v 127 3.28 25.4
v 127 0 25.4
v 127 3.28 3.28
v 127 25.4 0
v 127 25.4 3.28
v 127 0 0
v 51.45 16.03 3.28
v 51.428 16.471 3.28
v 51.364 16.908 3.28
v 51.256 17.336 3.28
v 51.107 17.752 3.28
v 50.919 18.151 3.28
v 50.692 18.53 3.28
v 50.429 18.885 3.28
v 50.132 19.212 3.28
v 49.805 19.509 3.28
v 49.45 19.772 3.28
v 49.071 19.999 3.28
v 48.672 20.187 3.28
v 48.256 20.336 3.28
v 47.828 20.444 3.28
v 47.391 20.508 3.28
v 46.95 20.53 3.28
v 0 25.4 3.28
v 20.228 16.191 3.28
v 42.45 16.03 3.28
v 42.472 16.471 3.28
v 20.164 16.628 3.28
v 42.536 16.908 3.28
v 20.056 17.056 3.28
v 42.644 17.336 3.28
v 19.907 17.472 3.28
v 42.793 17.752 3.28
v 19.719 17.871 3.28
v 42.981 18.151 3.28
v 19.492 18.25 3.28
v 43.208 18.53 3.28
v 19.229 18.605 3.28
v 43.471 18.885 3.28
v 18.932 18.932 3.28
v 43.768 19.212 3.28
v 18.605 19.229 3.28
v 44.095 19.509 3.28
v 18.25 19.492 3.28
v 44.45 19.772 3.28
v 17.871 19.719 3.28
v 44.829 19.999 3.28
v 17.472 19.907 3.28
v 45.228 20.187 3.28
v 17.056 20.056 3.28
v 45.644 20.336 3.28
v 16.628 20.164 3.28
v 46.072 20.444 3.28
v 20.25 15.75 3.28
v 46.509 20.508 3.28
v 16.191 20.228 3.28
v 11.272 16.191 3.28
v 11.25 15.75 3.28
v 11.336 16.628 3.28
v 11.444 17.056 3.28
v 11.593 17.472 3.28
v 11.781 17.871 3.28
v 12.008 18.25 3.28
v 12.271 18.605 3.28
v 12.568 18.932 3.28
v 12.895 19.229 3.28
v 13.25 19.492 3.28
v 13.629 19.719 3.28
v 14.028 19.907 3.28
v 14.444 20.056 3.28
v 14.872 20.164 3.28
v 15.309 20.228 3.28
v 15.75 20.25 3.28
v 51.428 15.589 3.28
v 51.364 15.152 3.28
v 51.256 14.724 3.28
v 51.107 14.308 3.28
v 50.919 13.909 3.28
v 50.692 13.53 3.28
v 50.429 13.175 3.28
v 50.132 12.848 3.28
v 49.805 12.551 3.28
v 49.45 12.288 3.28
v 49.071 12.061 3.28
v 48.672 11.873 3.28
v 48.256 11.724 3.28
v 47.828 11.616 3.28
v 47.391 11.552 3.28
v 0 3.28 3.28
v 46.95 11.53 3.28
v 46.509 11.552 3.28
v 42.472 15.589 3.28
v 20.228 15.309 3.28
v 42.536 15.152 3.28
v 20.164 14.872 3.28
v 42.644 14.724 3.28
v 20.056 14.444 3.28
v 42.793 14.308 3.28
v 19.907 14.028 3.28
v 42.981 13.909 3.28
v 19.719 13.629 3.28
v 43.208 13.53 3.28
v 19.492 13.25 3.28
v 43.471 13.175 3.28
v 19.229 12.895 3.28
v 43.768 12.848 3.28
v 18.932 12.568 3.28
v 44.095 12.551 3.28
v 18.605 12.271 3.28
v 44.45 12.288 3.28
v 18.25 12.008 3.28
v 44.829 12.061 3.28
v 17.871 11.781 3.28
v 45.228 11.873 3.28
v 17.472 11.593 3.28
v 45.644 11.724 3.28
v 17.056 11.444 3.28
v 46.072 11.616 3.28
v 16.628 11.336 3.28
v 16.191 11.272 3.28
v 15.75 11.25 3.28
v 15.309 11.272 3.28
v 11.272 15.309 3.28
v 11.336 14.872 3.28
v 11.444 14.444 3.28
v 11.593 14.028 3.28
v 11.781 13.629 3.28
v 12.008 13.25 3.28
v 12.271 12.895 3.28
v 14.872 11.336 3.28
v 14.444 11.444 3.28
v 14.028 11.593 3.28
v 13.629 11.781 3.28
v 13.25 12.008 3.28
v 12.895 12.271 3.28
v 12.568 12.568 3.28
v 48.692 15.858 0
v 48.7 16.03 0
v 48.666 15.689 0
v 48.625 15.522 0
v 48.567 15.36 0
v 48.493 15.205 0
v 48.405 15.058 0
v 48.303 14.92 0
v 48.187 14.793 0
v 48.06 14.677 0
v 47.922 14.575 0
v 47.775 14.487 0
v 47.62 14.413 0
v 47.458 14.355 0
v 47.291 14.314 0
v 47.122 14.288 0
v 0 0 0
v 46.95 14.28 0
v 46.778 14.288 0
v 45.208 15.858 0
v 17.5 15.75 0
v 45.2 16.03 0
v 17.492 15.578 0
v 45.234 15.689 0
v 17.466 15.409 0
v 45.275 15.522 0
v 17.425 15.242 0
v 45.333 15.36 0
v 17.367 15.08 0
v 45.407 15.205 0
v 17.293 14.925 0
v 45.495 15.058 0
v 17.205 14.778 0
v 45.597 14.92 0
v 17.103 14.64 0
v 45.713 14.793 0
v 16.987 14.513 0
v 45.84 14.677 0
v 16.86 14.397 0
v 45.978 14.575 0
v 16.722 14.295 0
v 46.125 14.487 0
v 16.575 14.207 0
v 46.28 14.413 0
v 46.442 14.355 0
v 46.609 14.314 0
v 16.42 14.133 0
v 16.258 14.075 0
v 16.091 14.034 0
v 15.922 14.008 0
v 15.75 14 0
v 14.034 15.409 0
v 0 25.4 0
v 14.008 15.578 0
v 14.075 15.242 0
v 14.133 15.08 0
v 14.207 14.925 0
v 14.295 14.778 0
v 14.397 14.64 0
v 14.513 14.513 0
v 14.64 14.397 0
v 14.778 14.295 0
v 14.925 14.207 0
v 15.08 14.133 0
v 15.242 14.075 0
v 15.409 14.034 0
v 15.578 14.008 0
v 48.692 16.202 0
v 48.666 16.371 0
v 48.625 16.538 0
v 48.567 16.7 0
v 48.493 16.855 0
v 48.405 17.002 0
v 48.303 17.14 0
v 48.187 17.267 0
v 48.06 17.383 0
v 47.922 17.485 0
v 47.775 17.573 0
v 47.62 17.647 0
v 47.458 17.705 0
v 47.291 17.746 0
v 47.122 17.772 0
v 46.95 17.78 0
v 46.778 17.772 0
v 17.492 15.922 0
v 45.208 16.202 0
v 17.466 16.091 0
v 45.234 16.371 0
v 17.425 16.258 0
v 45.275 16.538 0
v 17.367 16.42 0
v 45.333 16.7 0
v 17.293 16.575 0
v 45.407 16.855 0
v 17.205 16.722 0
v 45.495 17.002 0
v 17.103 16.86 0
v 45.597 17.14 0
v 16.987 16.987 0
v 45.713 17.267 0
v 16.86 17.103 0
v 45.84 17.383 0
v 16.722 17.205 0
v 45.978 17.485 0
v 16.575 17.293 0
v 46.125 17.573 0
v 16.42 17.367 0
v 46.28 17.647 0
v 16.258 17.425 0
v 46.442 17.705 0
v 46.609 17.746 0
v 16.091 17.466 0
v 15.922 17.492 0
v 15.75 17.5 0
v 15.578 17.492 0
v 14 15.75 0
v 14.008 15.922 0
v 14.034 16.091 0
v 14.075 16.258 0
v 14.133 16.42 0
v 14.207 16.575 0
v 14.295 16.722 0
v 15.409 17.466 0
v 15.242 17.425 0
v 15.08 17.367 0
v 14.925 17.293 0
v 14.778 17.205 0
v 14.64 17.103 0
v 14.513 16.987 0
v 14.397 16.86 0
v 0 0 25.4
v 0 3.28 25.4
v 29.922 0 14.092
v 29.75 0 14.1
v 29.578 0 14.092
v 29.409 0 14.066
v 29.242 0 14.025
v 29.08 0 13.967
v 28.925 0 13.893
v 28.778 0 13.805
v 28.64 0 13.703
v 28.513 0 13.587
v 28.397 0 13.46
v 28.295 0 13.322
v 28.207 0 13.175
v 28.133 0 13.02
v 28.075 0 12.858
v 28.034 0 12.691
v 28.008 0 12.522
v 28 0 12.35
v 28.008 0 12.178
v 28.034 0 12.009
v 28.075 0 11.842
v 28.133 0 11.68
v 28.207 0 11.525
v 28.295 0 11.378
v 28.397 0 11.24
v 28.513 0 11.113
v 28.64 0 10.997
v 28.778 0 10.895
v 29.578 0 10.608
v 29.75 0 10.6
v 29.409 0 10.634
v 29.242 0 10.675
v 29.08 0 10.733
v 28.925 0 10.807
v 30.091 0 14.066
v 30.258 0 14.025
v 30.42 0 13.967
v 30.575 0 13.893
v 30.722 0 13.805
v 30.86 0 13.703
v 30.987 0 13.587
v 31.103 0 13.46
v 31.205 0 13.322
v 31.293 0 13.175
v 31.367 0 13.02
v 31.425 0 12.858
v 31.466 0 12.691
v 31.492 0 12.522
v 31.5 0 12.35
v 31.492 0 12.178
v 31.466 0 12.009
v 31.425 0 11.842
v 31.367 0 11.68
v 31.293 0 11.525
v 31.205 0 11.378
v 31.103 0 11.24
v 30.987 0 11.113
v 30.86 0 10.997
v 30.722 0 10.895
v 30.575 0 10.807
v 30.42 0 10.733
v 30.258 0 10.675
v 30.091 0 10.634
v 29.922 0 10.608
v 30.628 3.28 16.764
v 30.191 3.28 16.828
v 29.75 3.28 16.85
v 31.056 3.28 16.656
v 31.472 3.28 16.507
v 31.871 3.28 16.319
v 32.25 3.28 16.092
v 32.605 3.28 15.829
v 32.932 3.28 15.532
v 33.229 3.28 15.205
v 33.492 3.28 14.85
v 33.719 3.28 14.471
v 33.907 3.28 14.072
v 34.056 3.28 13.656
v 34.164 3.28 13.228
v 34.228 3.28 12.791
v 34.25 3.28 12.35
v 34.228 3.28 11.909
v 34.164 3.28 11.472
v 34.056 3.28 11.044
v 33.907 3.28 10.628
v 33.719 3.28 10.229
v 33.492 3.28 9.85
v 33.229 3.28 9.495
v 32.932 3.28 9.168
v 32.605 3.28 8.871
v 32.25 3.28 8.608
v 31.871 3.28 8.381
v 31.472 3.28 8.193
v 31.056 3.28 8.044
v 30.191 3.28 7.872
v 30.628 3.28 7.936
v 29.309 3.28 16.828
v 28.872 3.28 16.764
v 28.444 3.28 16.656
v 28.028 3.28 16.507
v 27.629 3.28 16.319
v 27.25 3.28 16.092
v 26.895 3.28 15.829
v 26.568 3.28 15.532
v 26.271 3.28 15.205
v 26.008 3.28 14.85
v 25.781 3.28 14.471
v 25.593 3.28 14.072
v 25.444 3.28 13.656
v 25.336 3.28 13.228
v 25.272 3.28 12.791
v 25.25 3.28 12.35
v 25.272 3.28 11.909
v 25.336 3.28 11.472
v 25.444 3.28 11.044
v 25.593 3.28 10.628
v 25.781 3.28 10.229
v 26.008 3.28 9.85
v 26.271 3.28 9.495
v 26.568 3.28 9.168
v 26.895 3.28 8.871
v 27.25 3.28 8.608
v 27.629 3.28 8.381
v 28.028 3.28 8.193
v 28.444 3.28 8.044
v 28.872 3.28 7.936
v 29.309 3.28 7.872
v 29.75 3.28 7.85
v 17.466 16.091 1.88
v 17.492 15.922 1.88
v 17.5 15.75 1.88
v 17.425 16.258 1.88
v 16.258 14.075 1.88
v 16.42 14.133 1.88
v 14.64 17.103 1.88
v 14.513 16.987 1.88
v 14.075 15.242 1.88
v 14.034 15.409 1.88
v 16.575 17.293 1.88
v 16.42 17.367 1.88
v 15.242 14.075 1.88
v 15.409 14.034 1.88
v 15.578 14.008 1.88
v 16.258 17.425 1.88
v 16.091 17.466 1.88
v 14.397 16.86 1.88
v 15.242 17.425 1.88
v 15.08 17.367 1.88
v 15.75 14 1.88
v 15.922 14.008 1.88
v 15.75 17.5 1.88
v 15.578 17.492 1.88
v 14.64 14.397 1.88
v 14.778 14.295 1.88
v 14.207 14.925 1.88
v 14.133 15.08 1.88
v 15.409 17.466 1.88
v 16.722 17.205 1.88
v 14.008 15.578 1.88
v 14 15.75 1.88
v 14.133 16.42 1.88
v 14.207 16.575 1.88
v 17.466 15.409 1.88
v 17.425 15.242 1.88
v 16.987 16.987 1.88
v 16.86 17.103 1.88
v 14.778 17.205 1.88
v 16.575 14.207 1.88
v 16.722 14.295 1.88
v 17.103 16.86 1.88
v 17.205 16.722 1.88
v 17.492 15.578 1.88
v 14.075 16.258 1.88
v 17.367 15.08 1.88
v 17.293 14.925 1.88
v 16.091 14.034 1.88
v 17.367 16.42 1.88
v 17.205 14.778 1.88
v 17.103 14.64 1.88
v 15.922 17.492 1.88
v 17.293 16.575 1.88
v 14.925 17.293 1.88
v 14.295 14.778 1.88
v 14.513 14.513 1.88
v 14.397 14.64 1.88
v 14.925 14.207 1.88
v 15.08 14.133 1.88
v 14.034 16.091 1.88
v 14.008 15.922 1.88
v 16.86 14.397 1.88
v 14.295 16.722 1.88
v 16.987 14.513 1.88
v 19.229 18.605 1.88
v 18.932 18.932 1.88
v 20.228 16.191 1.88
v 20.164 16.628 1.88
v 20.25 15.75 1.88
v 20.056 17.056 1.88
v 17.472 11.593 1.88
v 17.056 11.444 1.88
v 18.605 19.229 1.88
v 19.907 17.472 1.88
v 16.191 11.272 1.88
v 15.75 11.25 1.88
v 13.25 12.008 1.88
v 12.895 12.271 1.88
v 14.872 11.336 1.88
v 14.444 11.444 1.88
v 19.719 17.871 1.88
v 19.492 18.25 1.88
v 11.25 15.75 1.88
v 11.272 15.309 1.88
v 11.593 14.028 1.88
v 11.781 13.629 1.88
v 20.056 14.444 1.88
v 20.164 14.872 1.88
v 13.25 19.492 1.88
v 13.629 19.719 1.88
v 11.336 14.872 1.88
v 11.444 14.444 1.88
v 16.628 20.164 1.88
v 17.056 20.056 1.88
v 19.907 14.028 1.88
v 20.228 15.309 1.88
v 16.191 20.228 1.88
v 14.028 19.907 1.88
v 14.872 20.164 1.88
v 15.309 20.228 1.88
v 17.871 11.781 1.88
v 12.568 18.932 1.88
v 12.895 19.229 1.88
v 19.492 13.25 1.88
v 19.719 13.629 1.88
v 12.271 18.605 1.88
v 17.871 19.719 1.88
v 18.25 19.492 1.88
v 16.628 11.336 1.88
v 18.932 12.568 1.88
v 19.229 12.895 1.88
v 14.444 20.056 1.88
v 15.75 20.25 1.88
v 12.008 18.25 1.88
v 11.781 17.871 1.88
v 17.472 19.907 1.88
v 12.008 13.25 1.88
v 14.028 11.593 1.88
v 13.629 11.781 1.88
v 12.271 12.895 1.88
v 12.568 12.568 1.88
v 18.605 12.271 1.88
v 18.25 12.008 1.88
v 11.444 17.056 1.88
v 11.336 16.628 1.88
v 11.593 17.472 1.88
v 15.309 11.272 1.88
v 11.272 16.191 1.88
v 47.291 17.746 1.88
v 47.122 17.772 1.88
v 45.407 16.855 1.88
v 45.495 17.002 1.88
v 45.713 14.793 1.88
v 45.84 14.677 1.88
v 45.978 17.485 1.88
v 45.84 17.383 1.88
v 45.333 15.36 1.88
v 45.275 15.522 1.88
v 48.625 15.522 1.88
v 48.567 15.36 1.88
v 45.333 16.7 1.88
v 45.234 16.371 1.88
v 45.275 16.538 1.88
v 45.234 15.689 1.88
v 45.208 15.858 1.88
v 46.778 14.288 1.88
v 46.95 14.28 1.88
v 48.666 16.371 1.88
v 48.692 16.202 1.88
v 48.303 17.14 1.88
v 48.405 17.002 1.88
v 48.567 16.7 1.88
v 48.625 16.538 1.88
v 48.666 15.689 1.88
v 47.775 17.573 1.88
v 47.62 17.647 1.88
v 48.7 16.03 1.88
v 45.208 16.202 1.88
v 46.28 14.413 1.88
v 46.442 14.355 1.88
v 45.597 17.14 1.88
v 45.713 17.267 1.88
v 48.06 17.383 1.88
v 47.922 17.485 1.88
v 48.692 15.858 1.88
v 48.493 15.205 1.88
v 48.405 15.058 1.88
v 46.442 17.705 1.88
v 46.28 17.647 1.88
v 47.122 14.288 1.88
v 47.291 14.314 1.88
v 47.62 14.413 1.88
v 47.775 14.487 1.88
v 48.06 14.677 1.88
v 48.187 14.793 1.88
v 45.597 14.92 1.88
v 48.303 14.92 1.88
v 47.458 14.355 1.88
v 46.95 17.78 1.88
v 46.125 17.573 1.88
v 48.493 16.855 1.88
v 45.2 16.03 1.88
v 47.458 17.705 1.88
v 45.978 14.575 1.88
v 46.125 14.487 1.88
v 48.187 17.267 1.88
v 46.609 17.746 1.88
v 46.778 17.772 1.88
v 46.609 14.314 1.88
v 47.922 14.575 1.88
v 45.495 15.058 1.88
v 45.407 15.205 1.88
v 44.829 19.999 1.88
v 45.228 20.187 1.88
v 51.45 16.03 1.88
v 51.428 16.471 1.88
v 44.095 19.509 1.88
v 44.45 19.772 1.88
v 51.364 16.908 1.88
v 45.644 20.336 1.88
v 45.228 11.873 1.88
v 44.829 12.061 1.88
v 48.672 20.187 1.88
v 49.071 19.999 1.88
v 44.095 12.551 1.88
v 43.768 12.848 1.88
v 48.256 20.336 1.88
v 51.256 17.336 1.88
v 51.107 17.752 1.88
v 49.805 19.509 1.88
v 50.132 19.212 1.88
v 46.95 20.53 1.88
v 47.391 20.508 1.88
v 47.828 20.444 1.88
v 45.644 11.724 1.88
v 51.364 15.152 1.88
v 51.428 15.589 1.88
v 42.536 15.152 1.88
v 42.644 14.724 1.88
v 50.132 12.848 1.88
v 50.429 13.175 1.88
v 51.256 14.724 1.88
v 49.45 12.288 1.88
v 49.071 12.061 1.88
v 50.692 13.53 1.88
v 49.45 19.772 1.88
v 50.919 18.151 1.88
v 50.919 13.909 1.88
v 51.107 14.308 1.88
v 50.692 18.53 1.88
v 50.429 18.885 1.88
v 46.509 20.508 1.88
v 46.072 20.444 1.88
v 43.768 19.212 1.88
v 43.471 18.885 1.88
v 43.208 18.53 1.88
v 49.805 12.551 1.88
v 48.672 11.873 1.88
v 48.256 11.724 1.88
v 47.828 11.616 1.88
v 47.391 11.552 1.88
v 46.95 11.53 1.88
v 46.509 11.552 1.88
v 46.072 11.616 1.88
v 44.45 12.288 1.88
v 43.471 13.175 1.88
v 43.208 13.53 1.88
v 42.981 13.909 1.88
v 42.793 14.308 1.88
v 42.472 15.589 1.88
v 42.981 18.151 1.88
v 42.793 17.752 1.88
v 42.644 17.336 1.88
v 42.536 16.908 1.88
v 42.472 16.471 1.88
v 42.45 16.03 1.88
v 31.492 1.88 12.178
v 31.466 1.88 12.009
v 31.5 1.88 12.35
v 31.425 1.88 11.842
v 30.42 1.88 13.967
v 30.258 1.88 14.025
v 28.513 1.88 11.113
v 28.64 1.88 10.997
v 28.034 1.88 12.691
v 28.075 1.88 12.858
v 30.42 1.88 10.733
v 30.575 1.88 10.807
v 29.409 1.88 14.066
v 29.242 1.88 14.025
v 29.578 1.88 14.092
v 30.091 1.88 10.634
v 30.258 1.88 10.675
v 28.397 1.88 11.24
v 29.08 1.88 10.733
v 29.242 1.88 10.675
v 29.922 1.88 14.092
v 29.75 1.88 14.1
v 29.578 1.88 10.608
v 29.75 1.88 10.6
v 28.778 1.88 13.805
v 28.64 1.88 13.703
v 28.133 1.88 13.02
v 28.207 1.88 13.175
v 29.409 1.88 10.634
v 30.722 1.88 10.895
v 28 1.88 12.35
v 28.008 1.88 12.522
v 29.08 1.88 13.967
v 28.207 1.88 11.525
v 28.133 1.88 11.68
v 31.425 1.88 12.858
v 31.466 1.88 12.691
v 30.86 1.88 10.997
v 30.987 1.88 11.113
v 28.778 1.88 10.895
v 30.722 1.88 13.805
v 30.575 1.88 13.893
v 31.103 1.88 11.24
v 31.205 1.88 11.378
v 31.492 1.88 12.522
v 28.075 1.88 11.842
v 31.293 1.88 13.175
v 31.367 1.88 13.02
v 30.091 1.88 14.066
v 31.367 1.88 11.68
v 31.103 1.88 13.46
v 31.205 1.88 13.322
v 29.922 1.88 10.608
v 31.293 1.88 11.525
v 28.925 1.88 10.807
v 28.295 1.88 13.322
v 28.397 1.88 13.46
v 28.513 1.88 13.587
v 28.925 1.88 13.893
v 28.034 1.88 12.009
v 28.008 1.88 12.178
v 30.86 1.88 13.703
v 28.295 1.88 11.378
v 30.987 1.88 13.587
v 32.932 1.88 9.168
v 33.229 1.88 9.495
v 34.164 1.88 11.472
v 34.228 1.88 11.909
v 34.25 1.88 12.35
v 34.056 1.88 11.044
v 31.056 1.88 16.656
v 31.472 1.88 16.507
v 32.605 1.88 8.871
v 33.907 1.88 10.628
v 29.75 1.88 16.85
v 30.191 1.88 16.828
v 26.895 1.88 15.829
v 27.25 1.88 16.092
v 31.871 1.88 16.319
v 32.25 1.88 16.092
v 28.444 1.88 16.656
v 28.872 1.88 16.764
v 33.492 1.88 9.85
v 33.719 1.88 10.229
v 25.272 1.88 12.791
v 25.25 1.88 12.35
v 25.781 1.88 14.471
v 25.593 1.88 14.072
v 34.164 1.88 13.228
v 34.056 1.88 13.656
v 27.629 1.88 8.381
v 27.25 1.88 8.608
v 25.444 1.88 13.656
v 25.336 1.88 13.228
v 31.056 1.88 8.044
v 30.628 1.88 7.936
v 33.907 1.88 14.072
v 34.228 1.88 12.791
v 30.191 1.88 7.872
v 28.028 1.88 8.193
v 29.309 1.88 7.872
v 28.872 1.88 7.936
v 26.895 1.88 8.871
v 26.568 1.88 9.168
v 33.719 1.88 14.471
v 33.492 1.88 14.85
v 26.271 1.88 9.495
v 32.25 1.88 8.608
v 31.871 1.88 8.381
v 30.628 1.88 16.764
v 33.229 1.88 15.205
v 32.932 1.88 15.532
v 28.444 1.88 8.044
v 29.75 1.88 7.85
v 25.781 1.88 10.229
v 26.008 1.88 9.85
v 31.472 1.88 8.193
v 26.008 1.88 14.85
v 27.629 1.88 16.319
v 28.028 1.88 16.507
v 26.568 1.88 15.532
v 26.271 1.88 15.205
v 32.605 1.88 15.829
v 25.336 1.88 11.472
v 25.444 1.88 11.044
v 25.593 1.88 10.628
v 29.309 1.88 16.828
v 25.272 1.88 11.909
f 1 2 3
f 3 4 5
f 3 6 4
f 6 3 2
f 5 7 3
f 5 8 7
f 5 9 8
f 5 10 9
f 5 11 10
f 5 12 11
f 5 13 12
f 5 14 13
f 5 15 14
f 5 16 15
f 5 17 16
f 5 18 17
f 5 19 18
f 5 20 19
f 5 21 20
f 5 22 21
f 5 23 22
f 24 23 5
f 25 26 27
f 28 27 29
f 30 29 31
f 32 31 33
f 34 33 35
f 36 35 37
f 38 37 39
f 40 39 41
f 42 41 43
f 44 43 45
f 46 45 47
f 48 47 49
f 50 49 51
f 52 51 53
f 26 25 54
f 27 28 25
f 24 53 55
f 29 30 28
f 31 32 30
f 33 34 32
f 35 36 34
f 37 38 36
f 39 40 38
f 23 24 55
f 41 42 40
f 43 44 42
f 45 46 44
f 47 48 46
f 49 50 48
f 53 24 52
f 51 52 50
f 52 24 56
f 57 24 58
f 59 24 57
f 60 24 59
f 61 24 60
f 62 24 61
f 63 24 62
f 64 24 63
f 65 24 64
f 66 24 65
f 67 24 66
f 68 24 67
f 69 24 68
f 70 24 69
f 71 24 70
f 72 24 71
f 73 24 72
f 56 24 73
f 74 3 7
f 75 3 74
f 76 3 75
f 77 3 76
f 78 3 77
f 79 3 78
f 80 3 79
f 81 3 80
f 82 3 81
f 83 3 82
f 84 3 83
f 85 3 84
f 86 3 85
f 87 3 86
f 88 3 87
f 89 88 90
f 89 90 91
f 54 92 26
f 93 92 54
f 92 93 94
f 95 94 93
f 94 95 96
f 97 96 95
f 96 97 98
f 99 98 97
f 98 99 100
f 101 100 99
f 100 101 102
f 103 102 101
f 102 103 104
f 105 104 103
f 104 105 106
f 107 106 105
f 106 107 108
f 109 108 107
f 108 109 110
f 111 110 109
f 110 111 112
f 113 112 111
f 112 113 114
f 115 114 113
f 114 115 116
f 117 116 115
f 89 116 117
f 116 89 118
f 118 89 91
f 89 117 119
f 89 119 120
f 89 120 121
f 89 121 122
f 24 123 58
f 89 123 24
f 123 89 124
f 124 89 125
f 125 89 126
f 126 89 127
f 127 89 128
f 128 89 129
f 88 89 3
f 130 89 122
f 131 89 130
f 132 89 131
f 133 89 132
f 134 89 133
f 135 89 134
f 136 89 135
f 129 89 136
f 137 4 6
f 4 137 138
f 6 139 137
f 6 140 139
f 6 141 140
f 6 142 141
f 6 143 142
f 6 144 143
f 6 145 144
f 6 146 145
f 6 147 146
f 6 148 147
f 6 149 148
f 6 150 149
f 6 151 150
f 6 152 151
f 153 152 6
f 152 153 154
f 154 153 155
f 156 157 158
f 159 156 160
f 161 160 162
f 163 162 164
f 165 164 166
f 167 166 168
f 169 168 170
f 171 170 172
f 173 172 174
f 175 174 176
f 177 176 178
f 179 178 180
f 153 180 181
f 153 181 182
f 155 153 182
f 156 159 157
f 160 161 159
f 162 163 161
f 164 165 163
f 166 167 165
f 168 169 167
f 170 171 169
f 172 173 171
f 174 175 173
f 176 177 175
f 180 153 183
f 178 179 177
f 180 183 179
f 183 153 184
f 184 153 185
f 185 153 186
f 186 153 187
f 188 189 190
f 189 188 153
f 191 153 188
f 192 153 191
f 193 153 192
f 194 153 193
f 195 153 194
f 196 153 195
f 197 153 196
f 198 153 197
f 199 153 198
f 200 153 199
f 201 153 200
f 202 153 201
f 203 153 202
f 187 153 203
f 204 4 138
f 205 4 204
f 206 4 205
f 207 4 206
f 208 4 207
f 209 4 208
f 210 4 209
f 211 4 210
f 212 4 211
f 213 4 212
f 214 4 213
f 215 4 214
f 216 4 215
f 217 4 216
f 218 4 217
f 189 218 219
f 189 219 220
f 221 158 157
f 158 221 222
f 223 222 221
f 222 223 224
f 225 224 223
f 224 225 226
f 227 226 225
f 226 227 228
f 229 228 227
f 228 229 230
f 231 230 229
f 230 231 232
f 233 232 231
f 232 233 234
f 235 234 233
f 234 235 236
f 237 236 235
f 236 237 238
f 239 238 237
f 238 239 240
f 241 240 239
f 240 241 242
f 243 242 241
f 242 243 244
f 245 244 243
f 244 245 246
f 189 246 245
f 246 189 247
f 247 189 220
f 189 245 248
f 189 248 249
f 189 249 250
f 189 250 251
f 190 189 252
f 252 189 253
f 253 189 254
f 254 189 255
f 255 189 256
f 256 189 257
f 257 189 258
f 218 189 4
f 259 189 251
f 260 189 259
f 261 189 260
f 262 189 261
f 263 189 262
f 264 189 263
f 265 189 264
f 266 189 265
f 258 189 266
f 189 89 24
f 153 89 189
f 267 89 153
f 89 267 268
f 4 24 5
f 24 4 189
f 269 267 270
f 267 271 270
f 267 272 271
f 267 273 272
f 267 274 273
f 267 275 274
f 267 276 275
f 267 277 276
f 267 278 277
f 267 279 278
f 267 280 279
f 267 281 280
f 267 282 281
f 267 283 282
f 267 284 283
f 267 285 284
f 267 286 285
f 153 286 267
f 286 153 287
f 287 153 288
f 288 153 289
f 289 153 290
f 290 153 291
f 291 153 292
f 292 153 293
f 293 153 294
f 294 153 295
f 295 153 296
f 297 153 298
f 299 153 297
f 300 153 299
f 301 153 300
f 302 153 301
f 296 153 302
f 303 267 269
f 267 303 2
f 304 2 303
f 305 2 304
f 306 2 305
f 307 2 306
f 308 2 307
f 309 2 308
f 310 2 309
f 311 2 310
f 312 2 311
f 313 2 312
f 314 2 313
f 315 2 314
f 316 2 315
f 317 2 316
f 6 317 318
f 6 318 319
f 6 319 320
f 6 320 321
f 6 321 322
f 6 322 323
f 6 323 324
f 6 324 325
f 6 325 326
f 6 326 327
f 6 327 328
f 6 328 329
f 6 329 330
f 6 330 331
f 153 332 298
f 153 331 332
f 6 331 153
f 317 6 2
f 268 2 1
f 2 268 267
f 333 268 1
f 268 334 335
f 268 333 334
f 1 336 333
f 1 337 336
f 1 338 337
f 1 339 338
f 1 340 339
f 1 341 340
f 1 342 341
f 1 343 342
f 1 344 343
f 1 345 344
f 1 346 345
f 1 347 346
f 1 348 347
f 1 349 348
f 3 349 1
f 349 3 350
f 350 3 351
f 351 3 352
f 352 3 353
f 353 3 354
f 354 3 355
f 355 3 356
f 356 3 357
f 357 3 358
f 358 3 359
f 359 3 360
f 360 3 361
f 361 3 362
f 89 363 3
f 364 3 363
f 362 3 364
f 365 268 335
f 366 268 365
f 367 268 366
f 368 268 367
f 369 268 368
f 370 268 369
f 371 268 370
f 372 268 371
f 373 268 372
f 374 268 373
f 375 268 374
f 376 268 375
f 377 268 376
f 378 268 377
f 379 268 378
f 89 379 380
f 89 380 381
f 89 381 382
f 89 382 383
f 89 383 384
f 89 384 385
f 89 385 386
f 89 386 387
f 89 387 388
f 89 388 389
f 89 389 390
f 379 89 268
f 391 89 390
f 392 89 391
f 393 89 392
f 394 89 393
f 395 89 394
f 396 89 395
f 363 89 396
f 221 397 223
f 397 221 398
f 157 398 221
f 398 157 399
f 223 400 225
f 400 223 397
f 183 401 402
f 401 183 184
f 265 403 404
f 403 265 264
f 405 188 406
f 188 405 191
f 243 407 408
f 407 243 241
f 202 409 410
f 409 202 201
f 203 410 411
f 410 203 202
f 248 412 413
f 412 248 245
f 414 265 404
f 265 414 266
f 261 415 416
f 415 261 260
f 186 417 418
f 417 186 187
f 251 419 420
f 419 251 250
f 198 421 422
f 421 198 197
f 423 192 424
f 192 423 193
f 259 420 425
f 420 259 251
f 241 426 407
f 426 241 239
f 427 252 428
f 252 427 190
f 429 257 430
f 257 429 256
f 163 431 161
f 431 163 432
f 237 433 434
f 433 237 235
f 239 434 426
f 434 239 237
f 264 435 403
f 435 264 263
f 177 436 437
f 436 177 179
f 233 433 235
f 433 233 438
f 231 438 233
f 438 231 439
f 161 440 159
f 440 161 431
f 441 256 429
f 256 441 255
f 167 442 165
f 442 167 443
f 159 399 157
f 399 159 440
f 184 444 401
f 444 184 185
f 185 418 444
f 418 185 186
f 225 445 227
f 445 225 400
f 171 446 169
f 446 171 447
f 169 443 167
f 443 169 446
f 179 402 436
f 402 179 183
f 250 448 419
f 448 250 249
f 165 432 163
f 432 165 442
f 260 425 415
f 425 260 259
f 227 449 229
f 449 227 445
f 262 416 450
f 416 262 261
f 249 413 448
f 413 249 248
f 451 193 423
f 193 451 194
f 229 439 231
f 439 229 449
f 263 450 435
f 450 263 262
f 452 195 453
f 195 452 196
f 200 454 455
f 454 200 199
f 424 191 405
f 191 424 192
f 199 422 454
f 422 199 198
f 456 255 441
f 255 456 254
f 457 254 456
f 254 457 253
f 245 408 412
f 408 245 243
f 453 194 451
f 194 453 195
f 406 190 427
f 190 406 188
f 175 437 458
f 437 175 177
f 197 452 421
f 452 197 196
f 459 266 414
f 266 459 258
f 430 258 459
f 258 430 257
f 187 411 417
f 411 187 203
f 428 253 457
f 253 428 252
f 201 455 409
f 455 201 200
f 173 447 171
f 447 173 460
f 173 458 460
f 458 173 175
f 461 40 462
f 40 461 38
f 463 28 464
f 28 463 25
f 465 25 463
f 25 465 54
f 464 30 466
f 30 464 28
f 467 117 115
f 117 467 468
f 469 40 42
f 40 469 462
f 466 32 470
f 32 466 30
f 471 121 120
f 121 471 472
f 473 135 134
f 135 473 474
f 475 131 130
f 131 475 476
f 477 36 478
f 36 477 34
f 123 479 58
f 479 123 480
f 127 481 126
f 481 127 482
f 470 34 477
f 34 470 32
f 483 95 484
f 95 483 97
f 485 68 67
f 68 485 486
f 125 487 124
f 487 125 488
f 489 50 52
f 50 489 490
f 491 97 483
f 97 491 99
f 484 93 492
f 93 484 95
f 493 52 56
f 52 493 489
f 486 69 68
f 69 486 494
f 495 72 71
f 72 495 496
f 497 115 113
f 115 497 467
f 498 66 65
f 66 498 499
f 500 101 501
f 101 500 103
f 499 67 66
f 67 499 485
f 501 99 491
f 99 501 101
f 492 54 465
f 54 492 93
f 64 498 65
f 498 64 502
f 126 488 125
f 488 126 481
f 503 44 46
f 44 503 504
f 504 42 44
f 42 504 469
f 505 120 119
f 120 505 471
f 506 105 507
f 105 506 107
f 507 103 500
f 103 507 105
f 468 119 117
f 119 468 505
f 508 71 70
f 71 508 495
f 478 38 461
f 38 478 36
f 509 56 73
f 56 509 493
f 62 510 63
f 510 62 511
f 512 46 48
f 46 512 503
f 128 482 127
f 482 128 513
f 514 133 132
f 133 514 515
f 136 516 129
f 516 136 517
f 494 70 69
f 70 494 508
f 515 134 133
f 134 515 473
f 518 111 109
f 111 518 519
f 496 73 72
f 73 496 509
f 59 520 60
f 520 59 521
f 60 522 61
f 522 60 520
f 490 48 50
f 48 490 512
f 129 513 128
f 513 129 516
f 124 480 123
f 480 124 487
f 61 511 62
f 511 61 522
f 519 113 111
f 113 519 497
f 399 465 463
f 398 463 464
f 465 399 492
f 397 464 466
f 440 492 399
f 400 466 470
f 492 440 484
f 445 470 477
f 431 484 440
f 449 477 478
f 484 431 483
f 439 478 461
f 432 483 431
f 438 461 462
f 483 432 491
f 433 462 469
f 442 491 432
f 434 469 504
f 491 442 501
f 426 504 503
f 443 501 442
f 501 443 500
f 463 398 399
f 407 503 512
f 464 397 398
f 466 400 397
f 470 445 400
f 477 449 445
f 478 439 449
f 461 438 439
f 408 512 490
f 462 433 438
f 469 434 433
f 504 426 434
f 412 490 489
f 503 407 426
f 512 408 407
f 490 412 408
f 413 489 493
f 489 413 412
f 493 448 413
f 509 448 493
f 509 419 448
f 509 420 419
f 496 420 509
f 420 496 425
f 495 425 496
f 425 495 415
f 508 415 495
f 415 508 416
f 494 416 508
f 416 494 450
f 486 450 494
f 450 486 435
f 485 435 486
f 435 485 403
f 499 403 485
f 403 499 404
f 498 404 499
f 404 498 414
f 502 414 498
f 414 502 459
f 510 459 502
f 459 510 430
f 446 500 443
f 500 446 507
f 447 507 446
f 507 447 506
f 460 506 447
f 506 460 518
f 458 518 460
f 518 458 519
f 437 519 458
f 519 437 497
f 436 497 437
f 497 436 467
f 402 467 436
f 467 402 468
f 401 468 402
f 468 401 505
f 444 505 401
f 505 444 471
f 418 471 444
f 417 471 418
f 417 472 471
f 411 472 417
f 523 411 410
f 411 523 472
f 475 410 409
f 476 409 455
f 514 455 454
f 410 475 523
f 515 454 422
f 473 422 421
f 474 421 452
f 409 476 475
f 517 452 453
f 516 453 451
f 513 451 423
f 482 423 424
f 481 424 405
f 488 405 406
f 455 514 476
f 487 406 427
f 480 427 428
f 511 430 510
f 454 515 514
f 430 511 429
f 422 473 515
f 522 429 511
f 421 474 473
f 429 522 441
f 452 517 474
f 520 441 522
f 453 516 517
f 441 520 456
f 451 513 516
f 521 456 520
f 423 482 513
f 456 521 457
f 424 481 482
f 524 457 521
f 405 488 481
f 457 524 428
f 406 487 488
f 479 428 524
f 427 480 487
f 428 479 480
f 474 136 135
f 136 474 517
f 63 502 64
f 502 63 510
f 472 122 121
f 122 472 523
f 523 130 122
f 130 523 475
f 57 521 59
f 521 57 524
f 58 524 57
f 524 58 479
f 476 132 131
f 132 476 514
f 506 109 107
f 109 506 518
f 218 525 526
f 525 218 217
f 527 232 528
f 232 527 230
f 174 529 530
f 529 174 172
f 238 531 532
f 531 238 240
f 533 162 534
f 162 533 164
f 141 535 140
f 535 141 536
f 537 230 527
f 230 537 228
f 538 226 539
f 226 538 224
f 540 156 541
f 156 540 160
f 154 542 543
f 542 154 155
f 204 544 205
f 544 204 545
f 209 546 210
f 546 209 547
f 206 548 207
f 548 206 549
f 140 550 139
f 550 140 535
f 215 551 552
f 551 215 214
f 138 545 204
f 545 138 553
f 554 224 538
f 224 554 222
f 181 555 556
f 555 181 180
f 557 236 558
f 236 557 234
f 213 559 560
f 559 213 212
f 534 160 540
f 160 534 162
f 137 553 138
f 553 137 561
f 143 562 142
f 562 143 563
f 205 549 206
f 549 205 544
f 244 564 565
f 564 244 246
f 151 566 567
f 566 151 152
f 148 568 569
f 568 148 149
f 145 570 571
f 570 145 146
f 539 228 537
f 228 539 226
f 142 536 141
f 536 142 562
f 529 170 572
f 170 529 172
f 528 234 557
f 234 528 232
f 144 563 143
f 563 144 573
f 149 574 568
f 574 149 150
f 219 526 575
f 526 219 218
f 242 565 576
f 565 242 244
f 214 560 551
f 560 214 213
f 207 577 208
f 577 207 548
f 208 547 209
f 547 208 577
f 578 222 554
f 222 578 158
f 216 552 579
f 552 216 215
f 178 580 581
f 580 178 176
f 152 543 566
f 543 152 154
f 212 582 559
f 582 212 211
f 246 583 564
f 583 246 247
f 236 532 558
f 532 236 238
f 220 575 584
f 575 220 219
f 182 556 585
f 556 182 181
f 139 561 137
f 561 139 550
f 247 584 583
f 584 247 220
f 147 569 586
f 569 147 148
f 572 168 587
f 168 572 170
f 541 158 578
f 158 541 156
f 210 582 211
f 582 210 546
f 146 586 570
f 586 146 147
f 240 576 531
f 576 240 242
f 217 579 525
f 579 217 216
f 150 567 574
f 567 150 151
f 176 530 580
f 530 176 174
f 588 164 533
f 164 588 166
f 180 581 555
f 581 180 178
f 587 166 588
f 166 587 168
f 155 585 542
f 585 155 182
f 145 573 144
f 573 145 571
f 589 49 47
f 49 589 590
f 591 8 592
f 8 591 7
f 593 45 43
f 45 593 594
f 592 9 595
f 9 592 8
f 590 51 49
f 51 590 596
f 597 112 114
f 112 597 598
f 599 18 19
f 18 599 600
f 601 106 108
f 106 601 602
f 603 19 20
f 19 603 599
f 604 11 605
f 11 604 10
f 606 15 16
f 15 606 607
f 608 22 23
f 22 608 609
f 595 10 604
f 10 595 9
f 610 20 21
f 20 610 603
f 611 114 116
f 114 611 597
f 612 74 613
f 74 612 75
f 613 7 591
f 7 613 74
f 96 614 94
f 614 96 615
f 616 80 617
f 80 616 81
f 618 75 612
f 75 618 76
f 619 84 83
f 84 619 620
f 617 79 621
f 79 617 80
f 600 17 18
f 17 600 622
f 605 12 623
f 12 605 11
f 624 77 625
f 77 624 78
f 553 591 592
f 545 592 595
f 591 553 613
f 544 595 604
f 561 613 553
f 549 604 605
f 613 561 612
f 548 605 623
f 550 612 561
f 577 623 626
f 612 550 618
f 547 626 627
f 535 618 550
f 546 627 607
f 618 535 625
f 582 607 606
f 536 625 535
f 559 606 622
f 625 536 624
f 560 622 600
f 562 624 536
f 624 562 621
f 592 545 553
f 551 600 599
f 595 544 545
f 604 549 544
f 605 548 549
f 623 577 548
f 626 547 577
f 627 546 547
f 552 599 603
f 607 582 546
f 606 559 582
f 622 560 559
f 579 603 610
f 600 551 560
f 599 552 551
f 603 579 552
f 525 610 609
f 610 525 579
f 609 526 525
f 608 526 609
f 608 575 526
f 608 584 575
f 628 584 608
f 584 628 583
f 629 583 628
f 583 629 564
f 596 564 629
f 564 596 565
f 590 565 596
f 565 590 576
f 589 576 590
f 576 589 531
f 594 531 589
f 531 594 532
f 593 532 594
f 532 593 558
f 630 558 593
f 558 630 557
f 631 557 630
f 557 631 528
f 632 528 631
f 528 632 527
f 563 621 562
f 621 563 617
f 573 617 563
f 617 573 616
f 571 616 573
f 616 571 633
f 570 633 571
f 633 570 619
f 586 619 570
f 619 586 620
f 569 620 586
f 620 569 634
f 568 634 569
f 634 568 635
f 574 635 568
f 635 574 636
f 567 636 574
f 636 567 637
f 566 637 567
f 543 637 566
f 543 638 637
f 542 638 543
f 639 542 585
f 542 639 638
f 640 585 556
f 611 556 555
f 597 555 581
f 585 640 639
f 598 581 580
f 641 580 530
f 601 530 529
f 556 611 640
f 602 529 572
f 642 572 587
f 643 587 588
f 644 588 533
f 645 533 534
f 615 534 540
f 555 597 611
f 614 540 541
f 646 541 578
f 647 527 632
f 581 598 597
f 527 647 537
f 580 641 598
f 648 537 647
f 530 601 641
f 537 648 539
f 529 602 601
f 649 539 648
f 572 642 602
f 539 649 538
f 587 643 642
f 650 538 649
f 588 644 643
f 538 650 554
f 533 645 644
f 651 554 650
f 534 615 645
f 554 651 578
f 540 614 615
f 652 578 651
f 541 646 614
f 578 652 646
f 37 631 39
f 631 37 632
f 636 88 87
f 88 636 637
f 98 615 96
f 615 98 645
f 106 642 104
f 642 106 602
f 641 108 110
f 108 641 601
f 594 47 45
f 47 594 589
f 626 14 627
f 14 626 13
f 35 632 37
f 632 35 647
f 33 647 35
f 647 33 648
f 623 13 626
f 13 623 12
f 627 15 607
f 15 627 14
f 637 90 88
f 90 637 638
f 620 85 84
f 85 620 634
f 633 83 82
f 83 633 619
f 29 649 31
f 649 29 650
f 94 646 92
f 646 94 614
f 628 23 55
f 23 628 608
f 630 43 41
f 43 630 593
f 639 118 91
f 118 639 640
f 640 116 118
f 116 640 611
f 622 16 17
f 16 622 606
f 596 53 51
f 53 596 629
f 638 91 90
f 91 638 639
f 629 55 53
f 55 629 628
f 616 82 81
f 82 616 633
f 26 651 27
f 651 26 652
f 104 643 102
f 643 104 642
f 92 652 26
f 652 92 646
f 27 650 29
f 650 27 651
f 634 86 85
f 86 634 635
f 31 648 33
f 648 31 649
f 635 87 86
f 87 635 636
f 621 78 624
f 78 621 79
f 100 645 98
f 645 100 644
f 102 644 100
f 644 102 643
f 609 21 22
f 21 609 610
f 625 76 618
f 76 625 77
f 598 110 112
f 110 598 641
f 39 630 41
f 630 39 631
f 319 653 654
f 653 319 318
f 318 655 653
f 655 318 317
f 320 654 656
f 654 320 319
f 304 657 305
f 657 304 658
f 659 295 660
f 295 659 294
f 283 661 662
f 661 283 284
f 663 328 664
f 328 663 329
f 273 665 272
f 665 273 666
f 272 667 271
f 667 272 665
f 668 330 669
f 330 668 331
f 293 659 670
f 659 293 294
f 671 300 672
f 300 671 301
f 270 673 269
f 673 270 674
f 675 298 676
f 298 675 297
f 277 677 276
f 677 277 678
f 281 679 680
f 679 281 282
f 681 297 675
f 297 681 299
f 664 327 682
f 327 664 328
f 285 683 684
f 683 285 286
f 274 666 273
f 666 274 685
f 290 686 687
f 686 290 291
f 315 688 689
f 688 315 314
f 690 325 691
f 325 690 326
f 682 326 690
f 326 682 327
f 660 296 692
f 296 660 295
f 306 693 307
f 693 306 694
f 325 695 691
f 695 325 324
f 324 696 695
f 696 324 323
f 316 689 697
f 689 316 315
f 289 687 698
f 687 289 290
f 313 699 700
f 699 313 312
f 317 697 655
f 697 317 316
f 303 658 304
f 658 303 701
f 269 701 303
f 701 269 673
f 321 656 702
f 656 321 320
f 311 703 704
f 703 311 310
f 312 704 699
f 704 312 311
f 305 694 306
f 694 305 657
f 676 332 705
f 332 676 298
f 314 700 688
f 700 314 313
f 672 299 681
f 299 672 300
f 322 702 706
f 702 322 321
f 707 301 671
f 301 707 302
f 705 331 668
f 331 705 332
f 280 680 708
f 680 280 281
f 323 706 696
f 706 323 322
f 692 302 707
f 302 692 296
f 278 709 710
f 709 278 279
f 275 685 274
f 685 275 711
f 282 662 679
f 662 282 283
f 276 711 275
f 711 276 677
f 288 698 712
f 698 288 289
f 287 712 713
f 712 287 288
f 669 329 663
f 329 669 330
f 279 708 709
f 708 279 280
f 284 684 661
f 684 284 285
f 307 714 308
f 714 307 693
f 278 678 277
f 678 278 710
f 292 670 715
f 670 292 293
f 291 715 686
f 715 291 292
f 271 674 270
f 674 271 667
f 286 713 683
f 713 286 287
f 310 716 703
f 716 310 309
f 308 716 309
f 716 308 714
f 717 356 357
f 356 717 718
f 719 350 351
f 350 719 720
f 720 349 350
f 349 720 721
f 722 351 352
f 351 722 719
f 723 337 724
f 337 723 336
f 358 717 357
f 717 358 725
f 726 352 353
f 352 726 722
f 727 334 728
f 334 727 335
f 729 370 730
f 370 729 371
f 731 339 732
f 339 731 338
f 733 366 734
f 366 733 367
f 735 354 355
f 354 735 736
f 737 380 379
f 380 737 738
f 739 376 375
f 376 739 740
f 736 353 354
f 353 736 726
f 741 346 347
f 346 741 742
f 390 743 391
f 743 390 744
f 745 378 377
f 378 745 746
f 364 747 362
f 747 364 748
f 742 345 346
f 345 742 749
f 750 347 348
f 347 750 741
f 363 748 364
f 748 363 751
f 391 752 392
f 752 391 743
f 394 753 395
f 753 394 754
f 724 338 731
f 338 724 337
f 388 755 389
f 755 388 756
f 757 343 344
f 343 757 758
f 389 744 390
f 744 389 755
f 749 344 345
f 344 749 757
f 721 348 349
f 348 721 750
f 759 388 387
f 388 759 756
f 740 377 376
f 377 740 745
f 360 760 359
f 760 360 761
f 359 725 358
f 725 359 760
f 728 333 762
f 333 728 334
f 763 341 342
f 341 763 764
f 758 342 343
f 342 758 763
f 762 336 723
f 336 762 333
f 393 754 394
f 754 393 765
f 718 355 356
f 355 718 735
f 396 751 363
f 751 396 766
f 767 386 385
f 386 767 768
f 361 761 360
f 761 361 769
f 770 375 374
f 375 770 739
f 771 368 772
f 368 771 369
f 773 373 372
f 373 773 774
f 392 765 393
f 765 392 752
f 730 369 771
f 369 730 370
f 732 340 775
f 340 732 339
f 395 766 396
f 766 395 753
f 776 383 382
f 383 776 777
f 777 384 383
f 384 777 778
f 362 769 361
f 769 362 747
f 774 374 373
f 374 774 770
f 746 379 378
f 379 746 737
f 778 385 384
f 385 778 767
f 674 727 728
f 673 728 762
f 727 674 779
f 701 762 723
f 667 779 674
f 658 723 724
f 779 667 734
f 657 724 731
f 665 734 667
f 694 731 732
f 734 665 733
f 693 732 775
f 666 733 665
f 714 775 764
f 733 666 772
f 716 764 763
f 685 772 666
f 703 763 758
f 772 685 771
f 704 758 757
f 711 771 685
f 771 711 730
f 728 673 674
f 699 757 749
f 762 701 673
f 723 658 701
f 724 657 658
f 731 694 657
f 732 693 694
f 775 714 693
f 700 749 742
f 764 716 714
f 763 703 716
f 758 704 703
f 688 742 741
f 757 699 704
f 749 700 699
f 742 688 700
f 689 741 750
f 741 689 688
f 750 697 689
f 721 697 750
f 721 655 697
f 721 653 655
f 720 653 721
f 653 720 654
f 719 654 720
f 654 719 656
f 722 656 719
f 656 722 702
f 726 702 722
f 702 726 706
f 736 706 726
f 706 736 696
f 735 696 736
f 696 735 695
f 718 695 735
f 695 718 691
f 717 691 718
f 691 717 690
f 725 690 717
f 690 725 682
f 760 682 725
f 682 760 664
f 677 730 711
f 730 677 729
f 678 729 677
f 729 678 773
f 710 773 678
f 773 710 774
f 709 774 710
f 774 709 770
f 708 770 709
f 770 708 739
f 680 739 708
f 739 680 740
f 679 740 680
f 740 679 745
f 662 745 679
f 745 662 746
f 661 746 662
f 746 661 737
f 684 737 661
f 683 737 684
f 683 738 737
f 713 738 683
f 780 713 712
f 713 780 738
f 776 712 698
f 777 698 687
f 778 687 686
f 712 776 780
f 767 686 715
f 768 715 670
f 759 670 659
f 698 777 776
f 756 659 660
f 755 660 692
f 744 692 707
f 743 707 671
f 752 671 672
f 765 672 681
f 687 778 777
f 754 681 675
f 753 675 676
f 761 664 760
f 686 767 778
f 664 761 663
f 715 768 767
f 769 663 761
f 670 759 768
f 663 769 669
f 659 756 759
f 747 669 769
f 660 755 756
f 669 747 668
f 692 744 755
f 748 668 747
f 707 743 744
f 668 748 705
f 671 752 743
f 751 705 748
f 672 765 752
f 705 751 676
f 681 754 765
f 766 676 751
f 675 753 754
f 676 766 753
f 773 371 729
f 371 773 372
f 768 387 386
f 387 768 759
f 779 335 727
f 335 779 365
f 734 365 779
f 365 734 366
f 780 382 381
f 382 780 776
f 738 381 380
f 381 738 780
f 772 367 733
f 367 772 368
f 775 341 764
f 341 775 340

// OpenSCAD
// The aluminium angle on the Carvera (2026-11-03): 1 x 1 in angle, 1/8 in
// wall, three 6-32 clearance holes, two in one leg and one in the other. The
// screws go into threaded inserts in the part it sits on; each insert stands
// 1.1 proud as a 7.5 boss, so the inside faces get a round pocket at each hole.
// The printed camera bracket (part = "bracket") is this angle cut to 56 with a
// 1 x 1 in cap on its lower end; see below.
//
// Measured by the user (calipers, 2026-11-03). Along the length, from the end
// nearest the holes to the near side of each hole: 14 and 45.2 on the
// two-hole leg, 28 on the one-hole leg. Across, from the outside corner to the
// near side of each hole: 14 (first hole), 10.6 (the one-hole leg's hole),
// 14.28 (the far hole). Centres are those plus half a hole.
// Not measured: the length (127 = 5 in, a guess from the photos). Our pick:
// the pocket depth clearance; the user set the pockets to 9 across.
//
// Datum: the outside corner runs along +x, from x = 0 at the measured end.
// The two-hole leg lies flat (z = 0 to t, y = 0 to leg); the one-hole leg
// stands up (y = 0 to t, z = 0 to leg). The inside of the angle is y, z > t.

/* [Show] */
// "angle" (the aluminium), "bracket" (as mounted) or "print" (bracket on the bed)
part = "angle";
$fn = 64;

/* [Angle, measured] */
leg = 25.4;            // 1 in legs, outside
t = 3.28;              // wall (1/8 in nominal)
hole_d = 3.5;          // 6-32 clearance

// measured to the near side of each hole
a1_along = 14;    a1_across = 14;      // two-hole leg, near the end
a2_along = 45.2;  a2_across = 14.28;   // two-hole leg, far
b1_along = 28;    b1_across = 10.6;    // one-hole leg

/* [Angle, guessed] */
len = 127;             // not measured yet

/* [Camera bracket] */
bracket_l = 56;        // the user's: the angle part, top end to the cap
cap_t = 6;             // the user's: 1 x 1 in square cap on the lower end
camera_hole_d = 6.8;   // 1/4-20 clearance, our pick (6.35 screw, prints shrink)

/* [Insert bosses] */
boss_d = 7.5;          // measured
boss_h = 1.1;          // measured, proud of the mating face
pocket_clear_d = 1.5;  // on the diameter: 9 pockets (8 printed tight, 2026-11-03)
pocket_clear_h = 0.3;  // our pick
pocket_d = boss_d + pocket_clear_d;
pocket_h = boss_h + pocket_clear_h;

eps = 0.01;
r = hole_d / 2;

// hole centres: [along, across from the outside corner]
a_holes = [[a1_along + r, a1_across + r], [a2_along + r, a2_across + r]];
b_holes = [[b1_along + r, b1_across + r]];

echo(a_holes = a_holes, b_holes = b_holes, pocket_d = pocket_d, pocket_h = pocket_h);
for (h = concat(a_holes, b_holes))
    assert(h[1] - pocket_d / 2 > t, "pocket runs into the other leg");
for (h = concat(a_holes, b_holes))
    assert(h[1] + pocket_d / 2 < leg, "pocket runs off the leg's edge");

module angle(l = len) {
    difference() {
        union() {
            cube([l, leg, t]);
            cube([l, t, leg]);
        }
        // two-hole leg: holes down z, pockets in its inside (top) face
        for (h = a_holes) translate([h[0], h[1], 0]) {
            translate([0, 0, -eps]) cylinder(d = hole_d, h = t + 2 * eps);
            translate([0, 0, t - pocket_h]) cylinder(d = pocket_d, h = pocket_h + eps);
        }
        // one-hole leg: holes along y, pockets in its inside face (y = t)
        for (h = b_holes) translate([h[0], 0, h[1]]) rotate([-90, 0, 0]) {
            translate([0, 0, -eps]) cylinder(d = hole_d, h = t + 2 * eps);
            translate([0, 0, t - pocket_h]) cylinder(d = pocket_d, h = pocket_h + eps);
        }
    }
}

// The bracket as mounted on the machine (the user's view, 2026-11-03): holes
// at the top, the one-hole leg facing you (y = 0 to t), the two-hole leg on
// your left (x = 0 to t), the outside corner at front left on the z axis.
// It hangs down: z = 0 is the cap's underside, the top end at bracket_h. The
// camera screw goes down through the cap's centre from inside the L.
bracket_h = bracket_l + cap_t;

module bracket() {
    // the angle's frame turned upright: its leg-across z -> x, y -> y, along -> down from the top
    multmatrix([[0, 0, 1, 0], [0, 1, 0, 0], [-1, 0, 0, bracket_h], [0, 0, 0, 1]])
        angle(bracket_l);
    difference() {
        cube([leg, leg, cap_t + eps]);
        translate([leg / 2, leg / 2, -eps]) cylinder(d = camera_hole_d, h = cap_t + 3 * eps);
    }
}

// on the bed: the two-hole leg's outside face down, so its pockets open
// upwards and the layers run along the bracket
module bracket_print() {
    rotate([0, -90, 0]) bracket();
}

if (part == "angle") angle();
if (part == "bracket") bracket();
if (part == "print") bracket_print();
